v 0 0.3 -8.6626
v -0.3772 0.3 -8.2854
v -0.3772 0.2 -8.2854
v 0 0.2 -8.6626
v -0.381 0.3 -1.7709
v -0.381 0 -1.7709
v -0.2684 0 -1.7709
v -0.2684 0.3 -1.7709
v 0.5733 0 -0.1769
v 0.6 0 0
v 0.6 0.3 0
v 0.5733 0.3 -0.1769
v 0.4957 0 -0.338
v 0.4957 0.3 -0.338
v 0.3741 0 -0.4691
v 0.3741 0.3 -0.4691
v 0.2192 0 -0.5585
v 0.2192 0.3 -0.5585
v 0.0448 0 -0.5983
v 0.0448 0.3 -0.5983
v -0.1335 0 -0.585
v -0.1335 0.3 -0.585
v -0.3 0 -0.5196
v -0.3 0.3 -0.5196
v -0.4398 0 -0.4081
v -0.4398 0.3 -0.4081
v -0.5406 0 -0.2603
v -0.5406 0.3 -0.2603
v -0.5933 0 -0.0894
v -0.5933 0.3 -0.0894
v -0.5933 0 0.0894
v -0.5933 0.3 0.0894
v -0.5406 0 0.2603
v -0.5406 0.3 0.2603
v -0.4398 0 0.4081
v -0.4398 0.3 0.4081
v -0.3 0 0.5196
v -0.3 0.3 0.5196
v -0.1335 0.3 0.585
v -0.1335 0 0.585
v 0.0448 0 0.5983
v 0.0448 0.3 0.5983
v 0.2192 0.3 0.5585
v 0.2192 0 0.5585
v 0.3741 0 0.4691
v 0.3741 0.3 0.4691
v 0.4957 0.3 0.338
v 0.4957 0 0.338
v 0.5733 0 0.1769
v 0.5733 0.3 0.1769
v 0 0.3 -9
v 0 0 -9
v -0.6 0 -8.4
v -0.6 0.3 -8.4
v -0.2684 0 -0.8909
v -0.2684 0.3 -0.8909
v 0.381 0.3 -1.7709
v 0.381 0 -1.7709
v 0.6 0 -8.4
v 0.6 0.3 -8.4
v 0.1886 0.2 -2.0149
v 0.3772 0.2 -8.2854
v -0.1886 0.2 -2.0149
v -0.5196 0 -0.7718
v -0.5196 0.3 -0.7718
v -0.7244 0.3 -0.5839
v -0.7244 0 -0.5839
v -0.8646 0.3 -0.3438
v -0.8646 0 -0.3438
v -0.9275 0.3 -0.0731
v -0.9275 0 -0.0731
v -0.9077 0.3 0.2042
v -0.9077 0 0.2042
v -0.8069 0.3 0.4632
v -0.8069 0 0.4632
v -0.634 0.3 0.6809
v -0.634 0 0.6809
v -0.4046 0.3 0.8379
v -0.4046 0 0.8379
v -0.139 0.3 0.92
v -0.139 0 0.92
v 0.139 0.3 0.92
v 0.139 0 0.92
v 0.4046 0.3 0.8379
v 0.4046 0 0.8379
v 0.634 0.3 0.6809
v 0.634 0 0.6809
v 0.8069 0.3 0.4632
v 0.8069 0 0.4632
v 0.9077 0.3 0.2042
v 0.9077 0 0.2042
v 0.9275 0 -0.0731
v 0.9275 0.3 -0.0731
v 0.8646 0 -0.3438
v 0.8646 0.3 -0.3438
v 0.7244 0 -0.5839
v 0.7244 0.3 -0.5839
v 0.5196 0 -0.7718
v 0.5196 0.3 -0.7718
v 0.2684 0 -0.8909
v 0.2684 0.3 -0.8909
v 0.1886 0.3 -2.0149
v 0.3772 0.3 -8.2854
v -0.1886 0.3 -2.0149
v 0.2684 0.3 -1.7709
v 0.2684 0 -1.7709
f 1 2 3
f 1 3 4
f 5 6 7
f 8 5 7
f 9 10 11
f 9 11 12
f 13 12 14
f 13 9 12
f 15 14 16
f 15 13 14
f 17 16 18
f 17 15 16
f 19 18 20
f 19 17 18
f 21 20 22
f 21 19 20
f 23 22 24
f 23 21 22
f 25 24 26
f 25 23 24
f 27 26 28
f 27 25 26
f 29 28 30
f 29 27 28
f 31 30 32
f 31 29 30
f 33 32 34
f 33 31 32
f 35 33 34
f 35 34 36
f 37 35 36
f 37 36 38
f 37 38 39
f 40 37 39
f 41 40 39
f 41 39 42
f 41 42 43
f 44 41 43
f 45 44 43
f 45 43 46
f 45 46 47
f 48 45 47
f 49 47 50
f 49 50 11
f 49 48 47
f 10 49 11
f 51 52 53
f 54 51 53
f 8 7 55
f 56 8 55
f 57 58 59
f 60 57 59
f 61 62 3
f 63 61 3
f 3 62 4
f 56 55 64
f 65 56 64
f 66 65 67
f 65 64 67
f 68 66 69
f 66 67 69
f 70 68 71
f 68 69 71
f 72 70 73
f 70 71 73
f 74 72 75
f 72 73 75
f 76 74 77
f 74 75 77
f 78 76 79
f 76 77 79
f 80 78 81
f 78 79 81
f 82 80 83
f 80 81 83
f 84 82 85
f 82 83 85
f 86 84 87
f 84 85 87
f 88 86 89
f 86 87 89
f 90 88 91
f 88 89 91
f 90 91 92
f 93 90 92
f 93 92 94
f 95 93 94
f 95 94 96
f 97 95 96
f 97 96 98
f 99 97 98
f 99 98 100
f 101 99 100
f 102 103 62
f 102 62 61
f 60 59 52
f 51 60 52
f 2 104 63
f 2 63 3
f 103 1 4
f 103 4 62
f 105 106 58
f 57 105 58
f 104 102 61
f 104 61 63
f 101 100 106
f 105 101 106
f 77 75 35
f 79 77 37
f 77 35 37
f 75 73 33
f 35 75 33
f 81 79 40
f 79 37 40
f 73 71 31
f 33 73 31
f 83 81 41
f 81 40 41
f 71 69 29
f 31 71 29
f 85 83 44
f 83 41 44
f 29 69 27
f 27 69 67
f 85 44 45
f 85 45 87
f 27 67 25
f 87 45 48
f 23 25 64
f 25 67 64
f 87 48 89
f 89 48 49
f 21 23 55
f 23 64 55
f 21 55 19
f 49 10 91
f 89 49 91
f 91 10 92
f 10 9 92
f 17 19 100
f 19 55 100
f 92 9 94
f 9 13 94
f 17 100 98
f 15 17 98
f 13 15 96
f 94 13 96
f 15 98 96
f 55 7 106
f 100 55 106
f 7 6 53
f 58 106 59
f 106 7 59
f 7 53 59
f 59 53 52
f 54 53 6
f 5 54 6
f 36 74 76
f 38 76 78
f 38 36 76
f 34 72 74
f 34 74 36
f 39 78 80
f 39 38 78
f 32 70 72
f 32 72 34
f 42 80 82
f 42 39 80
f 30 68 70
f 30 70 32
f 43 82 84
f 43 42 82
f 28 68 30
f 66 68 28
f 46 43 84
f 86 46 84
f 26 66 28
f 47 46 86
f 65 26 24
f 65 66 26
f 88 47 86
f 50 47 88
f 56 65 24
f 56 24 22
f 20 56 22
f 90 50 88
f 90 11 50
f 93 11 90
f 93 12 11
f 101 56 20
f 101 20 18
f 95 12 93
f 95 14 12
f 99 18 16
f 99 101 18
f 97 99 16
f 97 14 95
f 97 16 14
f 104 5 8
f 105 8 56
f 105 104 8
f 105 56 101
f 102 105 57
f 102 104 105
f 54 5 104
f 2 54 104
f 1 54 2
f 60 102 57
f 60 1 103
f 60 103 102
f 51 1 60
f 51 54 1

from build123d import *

# Parameters (mm, degrees)
BOSS_EXTRUDE1_DEPTH = 0.3
SKETCH2_R           = 0.6
CUT_EXTRUDE2_DEPTH  = 0.3
CUT_EXTRUDE3_DEPTH  = 0.1


with BuildPart() as part:
    # Sketch1 → Boss-Extrude1 (new body)
    with BuildSketch(Plane(origin=(0, 0, 0), x_dir=(1, 0, 0), z_dir=(0, 1, 0))):
        with BuildLine():
            Line((-0.268357858, 1.770915819), (-0.268357858, 0.8908721))
            ThreePointArc((-0.268357858, 0.8908721), (0, -0.93041337), (0.268357858, 0.8908721))
            Line((0.268357858, 0.8908721), (0.268357858, 1.770915819))
            Line((0.268357858, 1.770915819), (0.380994594, 1.770915819))
            Line((0.380994594, 1.770915819), (0.6, 8.4))
            Line((0.6, 8.4), (0, 9))
            Line((0, 9), (-0.6, 8.4))
            Line((-0.6, 8.4), (-0.380994594, 1.770915819))
            Line((-0.380994594, 1.770915819), (-0.268357858, 1.770915819))
        make_face()
    extrude(amount=BOSS_EXTRUDE1_DEPTH)

    # Sketch2 → Cut-Extrude2 (cut)
    with BuildSketch(Plane(origin=(0, 0, 0), x_dir=(1, 0, 0), z_dir=(0, 1, 0))):
        Circle(SKETCH2_R)
    extrude(amount=CUT_EXTRUDE2_DEPTH, mode=Mode.SUBTRACT)

    # Sketch4 → Cut-Extrude3 (cut)
    with BuildSketch(Plane(origin=(0, 0.3, 0), x_dir=(1, 0, 0), z_dir=(0, 1, 0))):
        Polygon((0, 8.662563121), (0.377183269, 8.285379851), (0.188591635, 2.014863516), (-0.188591635, 2.014863516), (-0.377183269, 8.285379851), align=None)
    extrude(amount=-CUT_EXTRUDE3_DEPTH, mode=Mode.SUBTRACT)


solid = part.part
